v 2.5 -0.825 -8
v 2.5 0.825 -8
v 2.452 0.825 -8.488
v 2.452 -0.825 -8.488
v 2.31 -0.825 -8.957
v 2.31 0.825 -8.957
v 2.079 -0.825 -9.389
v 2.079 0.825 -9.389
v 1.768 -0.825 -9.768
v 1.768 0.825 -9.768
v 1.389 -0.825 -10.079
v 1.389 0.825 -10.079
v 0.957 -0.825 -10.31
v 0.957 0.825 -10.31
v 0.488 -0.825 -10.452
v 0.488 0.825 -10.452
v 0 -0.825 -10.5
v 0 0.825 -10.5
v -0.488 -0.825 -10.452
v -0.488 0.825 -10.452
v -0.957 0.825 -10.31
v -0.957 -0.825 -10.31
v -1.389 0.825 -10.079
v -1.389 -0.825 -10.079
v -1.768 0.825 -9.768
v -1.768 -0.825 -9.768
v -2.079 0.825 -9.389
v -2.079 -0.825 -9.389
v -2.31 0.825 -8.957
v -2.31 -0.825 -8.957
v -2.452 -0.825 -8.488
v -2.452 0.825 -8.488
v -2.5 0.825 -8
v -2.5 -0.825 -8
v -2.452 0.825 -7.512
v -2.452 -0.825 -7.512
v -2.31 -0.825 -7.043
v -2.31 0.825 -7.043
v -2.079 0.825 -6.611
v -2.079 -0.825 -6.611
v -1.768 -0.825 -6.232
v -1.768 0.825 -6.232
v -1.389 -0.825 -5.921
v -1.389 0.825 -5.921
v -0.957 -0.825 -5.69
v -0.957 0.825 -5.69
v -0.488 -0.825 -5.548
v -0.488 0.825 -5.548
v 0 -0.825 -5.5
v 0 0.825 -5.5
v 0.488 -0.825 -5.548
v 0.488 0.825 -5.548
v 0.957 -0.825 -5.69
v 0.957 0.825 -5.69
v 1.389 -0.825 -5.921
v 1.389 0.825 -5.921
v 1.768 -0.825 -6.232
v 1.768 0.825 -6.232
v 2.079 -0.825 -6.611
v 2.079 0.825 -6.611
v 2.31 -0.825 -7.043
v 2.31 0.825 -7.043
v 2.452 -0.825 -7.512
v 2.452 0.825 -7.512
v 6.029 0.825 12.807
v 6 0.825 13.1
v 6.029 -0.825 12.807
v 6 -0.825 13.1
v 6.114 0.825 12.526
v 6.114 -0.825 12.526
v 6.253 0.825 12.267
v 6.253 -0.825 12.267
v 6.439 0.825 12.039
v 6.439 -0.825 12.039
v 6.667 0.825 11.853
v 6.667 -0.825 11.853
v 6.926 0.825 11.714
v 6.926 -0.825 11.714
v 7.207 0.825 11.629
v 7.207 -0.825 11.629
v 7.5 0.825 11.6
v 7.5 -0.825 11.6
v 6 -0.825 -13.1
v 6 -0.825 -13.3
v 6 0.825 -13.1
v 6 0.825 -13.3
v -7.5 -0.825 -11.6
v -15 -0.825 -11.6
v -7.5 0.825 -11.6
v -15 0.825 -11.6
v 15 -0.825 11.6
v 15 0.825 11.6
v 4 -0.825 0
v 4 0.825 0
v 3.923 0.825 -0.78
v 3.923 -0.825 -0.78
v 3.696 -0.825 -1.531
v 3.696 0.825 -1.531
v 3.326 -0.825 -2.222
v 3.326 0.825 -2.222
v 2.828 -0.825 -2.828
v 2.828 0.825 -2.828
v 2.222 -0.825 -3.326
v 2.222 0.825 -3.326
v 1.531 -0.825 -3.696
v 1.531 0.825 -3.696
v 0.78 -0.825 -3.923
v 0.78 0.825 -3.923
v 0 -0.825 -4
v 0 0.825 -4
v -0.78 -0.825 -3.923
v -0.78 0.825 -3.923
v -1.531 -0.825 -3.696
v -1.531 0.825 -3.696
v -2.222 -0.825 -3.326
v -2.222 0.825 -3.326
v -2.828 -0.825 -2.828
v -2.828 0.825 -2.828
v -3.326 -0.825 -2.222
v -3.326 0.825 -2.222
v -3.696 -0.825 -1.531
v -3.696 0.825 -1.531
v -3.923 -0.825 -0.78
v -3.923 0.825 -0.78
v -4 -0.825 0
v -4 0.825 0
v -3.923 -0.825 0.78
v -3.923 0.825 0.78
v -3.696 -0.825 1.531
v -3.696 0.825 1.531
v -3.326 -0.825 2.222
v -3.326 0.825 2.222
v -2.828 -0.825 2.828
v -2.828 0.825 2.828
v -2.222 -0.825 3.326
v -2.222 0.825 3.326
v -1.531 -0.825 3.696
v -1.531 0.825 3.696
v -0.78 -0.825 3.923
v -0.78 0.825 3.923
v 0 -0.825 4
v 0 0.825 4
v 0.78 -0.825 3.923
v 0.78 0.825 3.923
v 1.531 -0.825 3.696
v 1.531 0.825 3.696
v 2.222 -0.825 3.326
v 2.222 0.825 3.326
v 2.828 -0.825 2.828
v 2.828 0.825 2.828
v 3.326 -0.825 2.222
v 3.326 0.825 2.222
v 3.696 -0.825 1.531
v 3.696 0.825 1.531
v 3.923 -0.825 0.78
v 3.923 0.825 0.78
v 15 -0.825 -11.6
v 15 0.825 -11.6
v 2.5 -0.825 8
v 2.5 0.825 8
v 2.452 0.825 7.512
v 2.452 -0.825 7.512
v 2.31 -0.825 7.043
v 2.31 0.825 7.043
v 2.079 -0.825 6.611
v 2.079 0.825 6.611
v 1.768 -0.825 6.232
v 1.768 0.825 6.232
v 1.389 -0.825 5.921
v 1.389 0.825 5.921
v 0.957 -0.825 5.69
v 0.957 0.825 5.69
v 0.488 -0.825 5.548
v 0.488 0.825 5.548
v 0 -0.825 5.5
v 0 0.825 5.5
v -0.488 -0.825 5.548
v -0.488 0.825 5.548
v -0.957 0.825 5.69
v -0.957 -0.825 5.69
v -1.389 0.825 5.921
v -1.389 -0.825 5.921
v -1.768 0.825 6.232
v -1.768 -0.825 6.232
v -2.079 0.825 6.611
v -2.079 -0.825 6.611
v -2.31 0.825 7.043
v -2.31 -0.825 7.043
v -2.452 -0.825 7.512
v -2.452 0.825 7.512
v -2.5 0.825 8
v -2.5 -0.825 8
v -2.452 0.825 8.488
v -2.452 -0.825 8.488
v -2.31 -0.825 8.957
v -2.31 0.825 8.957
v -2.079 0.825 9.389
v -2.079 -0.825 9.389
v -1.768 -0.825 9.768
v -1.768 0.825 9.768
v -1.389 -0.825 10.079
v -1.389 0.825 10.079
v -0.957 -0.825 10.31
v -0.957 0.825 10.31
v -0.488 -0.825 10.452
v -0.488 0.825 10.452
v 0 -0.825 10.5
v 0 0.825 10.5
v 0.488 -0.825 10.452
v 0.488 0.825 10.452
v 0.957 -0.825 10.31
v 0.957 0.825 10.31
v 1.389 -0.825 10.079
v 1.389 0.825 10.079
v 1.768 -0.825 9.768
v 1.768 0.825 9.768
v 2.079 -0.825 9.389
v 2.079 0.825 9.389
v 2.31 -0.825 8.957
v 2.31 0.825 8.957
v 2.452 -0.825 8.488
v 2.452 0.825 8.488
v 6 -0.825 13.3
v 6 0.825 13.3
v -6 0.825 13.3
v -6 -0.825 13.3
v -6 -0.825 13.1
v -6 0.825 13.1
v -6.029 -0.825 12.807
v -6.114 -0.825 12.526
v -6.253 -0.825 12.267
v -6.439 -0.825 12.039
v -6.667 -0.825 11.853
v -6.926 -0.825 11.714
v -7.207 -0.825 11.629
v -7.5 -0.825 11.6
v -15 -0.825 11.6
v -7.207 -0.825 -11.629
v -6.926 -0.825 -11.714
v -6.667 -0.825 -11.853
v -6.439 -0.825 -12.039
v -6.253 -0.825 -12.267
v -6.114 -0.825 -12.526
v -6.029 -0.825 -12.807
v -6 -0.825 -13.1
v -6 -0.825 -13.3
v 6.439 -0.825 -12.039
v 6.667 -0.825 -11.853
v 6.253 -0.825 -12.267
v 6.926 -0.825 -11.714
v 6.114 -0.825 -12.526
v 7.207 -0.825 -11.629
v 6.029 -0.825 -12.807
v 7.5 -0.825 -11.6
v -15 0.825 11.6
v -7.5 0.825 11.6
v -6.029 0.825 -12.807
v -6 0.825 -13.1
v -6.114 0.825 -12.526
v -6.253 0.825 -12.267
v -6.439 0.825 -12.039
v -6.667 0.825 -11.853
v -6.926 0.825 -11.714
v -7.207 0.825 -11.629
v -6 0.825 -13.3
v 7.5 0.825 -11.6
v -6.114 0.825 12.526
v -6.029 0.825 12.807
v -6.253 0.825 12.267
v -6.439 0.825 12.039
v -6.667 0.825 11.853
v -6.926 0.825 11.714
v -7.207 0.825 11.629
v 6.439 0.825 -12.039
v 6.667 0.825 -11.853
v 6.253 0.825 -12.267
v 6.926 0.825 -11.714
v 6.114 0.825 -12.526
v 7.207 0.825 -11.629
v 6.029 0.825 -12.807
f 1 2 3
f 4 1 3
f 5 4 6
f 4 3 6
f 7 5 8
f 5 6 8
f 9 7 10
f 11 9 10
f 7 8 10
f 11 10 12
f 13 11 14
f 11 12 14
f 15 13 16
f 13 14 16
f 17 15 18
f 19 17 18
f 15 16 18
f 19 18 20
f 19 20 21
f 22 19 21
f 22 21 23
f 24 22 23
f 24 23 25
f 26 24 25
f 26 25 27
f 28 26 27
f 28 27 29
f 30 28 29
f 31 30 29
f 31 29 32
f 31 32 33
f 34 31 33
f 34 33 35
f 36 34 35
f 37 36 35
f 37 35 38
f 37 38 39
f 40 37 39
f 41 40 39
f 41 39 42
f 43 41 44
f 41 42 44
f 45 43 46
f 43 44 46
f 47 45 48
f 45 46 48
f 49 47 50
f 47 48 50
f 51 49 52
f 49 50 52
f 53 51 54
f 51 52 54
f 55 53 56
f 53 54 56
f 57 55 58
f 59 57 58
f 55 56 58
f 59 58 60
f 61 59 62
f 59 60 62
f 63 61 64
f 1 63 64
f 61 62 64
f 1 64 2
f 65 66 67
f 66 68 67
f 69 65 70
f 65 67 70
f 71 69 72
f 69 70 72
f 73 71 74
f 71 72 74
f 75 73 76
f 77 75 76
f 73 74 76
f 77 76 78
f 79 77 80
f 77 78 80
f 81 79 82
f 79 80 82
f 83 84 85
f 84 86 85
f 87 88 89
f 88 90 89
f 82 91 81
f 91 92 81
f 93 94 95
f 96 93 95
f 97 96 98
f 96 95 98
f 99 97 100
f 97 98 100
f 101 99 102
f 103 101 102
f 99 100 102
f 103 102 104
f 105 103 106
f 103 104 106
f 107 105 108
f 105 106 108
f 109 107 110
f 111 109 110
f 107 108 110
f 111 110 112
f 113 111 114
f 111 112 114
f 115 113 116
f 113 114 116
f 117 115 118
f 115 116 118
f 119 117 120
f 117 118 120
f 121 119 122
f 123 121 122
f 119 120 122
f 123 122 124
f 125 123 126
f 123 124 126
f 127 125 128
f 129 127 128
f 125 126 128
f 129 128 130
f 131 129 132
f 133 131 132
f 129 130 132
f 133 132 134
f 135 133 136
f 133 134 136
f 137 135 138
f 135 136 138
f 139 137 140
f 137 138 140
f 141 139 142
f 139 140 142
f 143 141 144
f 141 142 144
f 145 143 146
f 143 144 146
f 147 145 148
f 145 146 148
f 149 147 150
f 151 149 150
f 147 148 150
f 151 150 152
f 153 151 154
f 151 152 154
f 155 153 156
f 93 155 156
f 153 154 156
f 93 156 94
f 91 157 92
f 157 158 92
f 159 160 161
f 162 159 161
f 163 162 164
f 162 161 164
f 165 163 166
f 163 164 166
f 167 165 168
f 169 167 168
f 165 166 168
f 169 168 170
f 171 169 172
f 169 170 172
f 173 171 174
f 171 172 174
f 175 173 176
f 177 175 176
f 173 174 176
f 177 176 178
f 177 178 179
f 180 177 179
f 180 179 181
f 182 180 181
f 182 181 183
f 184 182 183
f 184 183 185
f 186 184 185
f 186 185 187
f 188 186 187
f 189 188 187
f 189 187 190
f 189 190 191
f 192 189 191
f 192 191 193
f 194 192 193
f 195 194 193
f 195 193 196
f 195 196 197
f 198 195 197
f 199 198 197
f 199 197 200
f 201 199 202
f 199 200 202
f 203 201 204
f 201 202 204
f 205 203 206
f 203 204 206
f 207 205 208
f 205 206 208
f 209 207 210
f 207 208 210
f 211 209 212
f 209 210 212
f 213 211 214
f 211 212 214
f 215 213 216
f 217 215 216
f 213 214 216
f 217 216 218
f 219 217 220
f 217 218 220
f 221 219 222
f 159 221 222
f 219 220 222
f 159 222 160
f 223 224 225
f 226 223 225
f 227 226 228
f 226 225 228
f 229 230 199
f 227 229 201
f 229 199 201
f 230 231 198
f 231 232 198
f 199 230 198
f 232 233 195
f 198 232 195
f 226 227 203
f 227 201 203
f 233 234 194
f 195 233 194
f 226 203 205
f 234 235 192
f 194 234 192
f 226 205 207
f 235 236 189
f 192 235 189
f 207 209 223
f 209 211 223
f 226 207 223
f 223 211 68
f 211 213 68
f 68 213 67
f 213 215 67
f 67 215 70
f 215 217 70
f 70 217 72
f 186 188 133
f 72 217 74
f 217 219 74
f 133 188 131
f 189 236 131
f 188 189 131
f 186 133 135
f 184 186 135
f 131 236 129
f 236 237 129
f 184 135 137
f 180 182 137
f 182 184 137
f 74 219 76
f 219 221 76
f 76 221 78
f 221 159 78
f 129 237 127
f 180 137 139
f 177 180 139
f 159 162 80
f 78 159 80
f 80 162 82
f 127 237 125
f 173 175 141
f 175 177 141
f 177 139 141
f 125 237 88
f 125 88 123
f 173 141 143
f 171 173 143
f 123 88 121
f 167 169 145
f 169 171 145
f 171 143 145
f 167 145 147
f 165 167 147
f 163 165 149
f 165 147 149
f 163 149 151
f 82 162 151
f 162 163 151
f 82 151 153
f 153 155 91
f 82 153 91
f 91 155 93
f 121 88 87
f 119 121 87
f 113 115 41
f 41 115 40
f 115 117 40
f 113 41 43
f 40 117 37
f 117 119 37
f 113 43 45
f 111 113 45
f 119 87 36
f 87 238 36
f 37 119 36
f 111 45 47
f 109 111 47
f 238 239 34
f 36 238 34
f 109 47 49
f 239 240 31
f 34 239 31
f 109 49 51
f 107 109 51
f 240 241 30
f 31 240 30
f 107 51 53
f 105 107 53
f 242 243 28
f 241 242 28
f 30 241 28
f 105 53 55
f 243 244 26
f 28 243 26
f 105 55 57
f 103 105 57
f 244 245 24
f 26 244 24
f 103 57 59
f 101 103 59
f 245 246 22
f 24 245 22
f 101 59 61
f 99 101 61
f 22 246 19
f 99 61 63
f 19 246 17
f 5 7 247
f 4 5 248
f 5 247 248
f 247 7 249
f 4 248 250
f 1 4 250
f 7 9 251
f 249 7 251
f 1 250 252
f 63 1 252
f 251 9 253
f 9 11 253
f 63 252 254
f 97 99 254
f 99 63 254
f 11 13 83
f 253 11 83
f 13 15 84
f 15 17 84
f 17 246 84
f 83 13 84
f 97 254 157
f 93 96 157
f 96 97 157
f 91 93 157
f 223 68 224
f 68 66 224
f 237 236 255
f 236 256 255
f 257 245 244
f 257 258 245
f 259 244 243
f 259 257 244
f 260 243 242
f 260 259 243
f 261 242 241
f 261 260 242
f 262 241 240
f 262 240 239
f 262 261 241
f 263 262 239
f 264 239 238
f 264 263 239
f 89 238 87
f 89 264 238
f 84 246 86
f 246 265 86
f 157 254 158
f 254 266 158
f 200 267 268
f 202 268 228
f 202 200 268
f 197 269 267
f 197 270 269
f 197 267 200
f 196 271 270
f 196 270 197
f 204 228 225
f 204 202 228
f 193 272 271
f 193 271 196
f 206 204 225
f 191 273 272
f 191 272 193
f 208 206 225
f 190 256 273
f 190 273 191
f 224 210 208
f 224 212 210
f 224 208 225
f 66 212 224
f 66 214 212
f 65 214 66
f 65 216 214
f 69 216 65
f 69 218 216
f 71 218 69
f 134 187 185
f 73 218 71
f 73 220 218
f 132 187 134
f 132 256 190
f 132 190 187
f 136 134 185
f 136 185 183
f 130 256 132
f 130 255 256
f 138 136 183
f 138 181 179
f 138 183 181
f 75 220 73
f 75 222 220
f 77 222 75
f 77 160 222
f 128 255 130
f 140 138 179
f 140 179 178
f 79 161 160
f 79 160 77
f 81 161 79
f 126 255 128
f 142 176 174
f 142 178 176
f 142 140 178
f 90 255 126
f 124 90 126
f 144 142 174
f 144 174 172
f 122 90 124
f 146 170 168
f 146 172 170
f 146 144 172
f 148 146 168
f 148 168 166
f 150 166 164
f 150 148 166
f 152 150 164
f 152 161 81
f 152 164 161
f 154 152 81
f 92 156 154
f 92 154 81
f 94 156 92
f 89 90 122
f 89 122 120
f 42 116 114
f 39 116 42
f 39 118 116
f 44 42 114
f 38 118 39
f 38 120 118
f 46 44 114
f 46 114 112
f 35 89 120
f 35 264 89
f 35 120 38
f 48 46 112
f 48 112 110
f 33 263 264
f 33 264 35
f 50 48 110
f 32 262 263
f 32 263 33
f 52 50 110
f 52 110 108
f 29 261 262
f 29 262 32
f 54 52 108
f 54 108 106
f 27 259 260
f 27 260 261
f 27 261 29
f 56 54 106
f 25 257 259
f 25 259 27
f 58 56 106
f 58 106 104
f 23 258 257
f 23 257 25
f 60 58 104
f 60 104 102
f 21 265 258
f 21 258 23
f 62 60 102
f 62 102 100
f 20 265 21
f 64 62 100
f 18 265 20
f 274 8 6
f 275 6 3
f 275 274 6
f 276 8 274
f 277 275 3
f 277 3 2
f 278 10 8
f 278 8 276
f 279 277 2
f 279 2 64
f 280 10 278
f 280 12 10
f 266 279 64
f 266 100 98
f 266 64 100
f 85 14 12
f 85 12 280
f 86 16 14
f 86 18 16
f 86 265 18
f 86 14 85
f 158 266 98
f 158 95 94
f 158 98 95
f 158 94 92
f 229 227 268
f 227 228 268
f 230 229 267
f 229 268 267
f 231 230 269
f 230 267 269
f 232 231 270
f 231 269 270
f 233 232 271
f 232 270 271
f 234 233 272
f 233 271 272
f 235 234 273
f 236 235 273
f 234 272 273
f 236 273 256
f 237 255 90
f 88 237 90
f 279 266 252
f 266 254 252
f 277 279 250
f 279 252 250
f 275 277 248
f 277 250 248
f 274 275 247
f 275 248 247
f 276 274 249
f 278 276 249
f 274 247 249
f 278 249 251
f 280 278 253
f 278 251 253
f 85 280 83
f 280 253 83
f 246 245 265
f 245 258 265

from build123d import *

# Parameters (mm, degrees)
SKIZZE1_R                       = 1.25
SKIZZE1_R_2                     = 5
AUFSATZ_LINEAR_AUSTRAGEN1_DEPTH = 0.825
VERRUNDUNG1_R                   = 1.5
SKIZZE3_R                       = 5
SKIZZE3_R_2                     = 4
AUFSATZ_LINEAR_AUSTRAGEN2_DEPTH = 1.65
SKIZZE4_R                       = 2.5
SCHNITT_LINEAR_AUSTRAGEN1_DEPTH = 2.65


with BuildPart() as part:
    # Skizze1 → Aufsatz-Linear austragen1 (new body, symmetric)
    with BuildSketch(Plane(origin=(0, 0, 0), x_dir=(1, 0, 0), z_dir=(0, 1, 0))):
        Polygon((-6, 11.6), (-6, 13.3), (6, 13.3), (6, 11.6), (15, 11.6), (15, -11.6), (6, -11.6), (6, -13.3), (-6, -13.3), (-6, -11.6), (-15, -11.6), (-15, 11.6), align=None)
        with Locations((0, -8)):
            Circle(SKIZZE1_R, mode=Mode.SUBTRACT)
        with Locations((0, 8)):
            Circle(SKIZZE1_R, mode=Mode.SUBTRACT)
        Circle(SKIZZE1_R_2, mode=Mode.SUBTRACT)
    extrude(amount=AUFSATZ_LINEAR_AUSTRAGEN1_DEPTH, both=True)

    # Verrundung1
    verrundung1_edges = [part.edges().sort_by_distance(p)[0] for p in [
        (-6, 0, 11.6),
        (-6, 0, -11.6),
        (6, 0, -11.6),
        (6, 0, 11.6),
    ]]
    fillet(verrundung1_edges, radius=VERRUNDUNG1_R)

    # Skizze3 → Aufsatz-Linear austragen2 (add)
    with BuildSketch(Plane(origin=(0, 0.825, 0), x_dir=(1, 0, 0), z_dir=(0, 1, 0))):
        Circle(SKIZZE3_R)
        Circle(SKIZZE3_R_2, mode=Mode.SUBTRACT)
    extrude(amount=-AUFSATZ_LINEAR_AUSTRAGEN2_DEPTH)

    # Skizze4 → Schnitt-Linear austragen1 (cut, through all)
    with BuildSketch(Plane(origin=(0, 0.825, 0), x_dir=(1, 0, 0), z_dir=(0, 1, 0))):
        with Locations((0, 8)):
            Circle(SKIZZE4_R)
        with Locations((0, -8)):
            Circle(SKIZZE4_R)
    extrude(amount=-SCHNITT_LINEAR_AUSTRAGEN1_DEPTH, mode=Mode.SUBTRACT)


solid = part.part
